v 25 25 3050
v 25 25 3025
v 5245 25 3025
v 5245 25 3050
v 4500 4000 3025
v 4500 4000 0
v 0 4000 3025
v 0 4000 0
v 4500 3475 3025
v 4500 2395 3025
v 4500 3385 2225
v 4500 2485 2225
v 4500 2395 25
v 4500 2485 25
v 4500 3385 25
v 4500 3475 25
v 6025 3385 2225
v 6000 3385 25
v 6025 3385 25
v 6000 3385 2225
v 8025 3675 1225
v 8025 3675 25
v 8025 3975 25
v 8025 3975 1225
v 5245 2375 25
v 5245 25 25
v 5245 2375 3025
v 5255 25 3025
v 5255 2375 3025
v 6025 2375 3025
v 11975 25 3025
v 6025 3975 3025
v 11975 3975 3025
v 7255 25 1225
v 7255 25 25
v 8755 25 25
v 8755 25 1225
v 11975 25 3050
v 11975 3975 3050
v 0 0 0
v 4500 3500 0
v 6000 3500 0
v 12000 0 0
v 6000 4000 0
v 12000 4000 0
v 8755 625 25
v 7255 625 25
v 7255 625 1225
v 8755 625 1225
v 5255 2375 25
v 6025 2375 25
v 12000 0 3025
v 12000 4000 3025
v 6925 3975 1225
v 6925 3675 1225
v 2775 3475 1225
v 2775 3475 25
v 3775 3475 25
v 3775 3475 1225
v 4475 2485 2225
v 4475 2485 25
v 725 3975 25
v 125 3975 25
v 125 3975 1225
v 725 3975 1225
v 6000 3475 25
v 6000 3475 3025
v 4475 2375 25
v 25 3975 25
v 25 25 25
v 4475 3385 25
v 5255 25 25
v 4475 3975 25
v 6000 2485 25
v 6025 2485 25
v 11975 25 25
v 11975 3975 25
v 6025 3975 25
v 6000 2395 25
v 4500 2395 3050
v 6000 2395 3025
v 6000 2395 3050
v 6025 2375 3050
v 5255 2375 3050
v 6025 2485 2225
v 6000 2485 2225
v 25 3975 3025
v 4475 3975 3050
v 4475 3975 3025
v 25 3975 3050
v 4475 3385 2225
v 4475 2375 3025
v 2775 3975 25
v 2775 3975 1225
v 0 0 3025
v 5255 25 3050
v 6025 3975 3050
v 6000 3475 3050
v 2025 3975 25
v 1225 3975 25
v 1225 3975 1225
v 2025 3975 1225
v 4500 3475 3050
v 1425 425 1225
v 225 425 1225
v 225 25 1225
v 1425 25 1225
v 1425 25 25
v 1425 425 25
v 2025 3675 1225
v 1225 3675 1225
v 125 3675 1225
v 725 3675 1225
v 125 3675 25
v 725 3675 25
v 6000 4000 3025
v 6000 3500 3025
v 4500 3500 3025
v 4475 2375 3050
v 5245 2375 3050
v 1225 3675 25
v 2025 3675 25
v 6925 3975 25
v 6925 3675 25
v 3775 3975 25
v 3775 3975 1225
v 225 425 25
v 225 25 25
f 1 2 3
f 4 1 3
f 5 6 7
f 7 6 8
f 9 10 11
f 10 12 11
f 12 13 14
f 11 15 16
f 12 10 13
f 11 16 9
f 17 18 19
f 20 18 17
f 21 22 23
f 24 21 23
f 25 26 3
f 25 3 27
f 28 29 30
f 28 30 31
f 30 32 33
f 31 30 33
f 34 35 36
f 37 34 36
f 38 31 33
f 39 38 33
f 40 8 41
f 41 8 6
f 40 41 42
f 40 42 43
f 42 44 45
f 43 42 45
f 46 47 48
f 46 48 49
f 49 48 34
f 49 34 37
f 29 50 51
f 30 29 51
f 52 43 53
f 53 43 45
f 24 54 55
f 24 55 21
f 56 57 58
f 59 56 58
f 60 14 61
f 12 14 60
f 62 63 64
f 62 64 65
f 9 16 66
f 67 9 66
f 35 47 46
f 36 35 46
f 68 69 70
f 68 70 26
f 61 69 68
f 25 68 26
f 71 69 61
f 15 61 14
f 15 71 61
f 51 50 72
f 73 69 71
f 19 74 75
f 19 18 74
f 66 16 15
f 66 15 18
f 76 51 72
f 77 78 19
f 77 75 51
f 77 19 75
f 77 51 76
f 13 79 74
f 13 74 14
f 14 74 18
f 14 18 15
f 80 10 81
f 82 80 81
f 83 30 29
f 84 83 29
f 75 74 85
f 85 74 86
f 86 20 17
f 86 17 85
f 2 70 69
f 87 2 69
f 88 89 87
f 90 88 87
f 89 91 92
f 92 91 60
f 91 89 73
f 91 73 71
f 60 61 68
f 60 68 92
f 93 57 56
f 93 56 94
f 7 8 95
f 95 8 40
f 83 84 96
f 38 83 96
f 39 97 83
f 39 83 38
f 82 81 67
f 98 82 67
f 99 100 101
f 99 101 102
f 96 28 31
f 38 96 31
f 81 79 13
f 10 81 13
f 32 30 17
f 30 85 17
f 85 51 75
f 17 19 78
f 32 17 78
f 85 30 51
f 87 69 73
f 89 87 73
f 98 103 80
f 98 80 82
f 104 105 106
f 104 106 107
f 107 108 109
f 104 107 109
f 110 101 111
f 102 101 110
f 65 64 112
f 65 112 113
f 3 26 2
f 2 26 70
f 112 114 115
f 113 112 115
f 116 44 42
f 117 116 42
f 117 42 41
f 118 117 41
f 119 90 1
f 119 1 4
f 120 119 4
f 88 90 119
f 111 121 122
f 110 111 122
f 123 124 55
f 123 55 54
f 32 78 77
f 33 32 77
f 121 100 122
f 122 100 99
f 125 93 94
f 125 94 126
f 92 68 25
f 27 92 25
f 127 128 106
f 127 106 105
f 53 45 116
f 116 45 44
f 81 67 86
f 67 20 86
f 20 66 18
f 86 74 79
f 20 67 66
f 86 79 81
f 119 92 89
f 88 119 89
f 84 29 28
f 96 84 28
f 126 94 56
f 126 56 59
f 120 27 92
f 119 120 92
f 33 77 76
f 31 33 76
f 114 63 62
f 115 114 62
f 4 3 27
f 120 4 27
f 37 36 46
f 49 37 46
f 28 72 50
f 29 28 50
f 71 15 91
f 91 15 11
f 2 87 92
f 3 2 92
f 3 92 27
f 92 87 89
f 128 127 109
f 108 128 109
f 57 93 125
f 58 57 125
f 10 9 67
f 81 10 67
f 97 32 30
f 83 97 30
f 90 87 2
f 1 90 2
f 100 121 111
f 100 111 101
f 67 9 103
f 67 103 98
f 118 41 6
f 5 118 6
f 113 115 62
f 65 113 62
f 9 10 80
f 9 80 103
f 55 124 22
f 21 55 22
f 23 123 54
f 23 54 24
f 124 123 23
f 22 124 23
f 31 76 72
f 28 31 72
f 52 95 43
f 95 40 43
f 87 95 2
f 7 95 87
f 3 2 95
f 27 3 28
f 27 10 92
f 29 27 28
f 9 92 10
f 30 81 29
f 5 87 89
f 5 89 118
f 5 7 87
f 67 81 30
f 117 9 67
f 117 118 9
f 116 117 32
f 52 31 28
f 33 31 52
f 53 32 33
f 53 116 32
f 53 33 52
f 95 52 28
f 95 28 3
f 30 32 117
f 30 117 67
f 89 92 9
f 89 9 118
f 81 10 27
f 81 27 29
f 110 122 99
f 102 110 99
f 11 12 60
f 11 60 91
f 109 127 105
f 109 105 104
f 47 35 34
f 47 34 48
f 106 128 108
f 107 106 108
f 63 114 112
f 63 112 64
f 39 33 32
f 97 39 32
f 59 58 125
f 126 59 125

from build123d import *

# Parameters (mm, degrees)
F1_DEPTH  = 25
F2_W      = 10
F2_H      = 2350
F3_DEPTH  = 3000
F4_W      = 900
F4_H      = 2200
F5_DEPTH  = 25
F6_W      = 900
F6_H      = 2200
F7_DEPTH  = 25
F8_W      = 600
F8_H      = 300
F9_DEPTH  = 1200
F8_W_2    = 800
F8_W_3    = 1000
F8_H_2    = 500
F8_W_4    = 1200
F8_H_3    = 400
F8_W_5    = 1500
F8_H_4    = 600
F8_W_6    = 1100
F11_DEPTH = 25
F10_W     = 1500
F10_H     = 1080


with BuildPart() as f1:
    # F0 (on Top) → F1 (new body)
    with BuildSketch(Plane.XY):
        Polygon((4500, 4000), (0, 4000), (0, 0), (12000, 0), (12000, 4000), (6000, 4000), (6000, 3500), (4500, 3500), align=None)
    extrude(amount=F1_DEPTH)

    # F2 (on face) → F3 (join)
    with BuildSketch(Plane.XY.offset(25)):
        Polygon((4500, 3500), (4500, 4000), (0, 4000), (0, 0), (12000, 0), (12000, 4000), (6000, 4000), (6000, 3500), align=None)
        Polygon((5245, 25), (25, 25), (25, 3975), (4475, 3975), (4475, 3475), (4500, 3475), (6000, 3475), (6025, 3475), (6025, 3975), (11975, 3975), (11975, 25), (5255, 25), align=None, mode=Mode.SUBTRACT)
        Polygon((4475, 2375), (5245, 2375), (5255, 2375), (6025, 2375), (6025, 3475), (6000, 3475), (6000, 2395), (4500, 2395), (4500, 3475), (4475, 3475), align=None)
        with Locations((5250, 1200)):
            Rectangle(F2_W, F2_H)
    extrude(amount=F3_DEPTH)

    # F4 (on face) → F5 (cut, through all)
    with BuildSketch(Plane.YZ.offset(4500)):
        with Locations((2935, 1125)):
            Rectangle(F4_W, F4_H)
    extrude(amount=-F5_DEPTH, mode=Mode.SUBTRACT)

    # F6 (on face) → F7 (cut, through all)
    with BuildSketch(Plane(origin=(6000, 0, 0), x_dir=(0, -1, 0), z_dir=(-1, 0, 0))):
        with Locations((-2935, 1125)):
            Rectangle(F6_W, F6_H)
    extrude(amount=-F7_DEPTH, mode=Mode.SUBTRACT)


with BuildPart() as f9:
    # F8 (on face) → F9 (new body)
    with BuildSketch(Plane.XY.offset(25)):
        with Locations((425, 3825)):
            Rectangle(F8_W, F8_H)
    extrude(amount=F9_DEPTH)


with BuildPart() as f9b:
    # F8 (on face) → F9, piece 2 (new body)
    with BuildSketch(Plane.XY.offset(25)):
        with Locations((1625, 3825)):
            Rectangle(F8_W_2, F8_H)
    extrude(amount=F9_DEPTH)


with BuildPart() as f9c:
    # F8 (on face) → F9, piece 3 (new body)
    with BuildSketch(Plane.XY.offset(25)):
        with Locations((3275, 3725)):
            Rectangle(F8_W_3, F8_H_2)
    extrude(amount=F9_DEPTH)


with BuildPart() as f9d:
    # F8 (on face) → F9, piece 4 (new body)
    with BuildSketch(Plane.XY.offset(25)):
        with Locations((825, 225)):
            Rectangle(F8_W_4, F8_H_3)
    extrude(amount=F9_DEPTH)


with BuildPart() as f9e:
    # F8 (on face) → F9, piece 5 (new body)
    with BuildSketch(Plane.XY.offset(25)):
        with Locations((8005, 325)):
            Rectangle(F8_W_5, F8_H_4)
    extrude(amount=F9_DEPTH)


with BuildPart() as f9f:
    # F8 (on face) → F9, piece 6 (new body)
    with BuildSketch(Plane.XY.offset(25)):
        with Locations((7475, 3825)):
            Rectangle(F8_W_6, F8_H)
    extrude(amount=F9_DEPTH)


with BuildPart() as f11:
    # F10 (on face) → F11 (new body)
    with BuildSketch(Plane.XY.offset(3025)):
        Polygon((6025, 2375), (5255, 2375), (5255, 25), (11975, 25), (11975, 3975), (6025, 3975), align=None)
    extrude(amount=F11_DEPTH)


with BuildPart() as f11b:
    # F10 (on face) → F11, piece 2 (new body)
    with BuildSketch(Plane.XY.offset(3025)):
        Polygon((25, 3975), (25, 25), (5245, 25), (5245, 2375), (4475, 2375), (4475, 3975), align=None)
    extrude(amount=F11_DEPTH)


with BuildPart() as f11c:
    # F10 (on face) → F11, piece 3 (new body)
    with BuildSketch(Plane.XY.offset(3025)):
        with Locations((5250, 2935)):
            Rectangle(F10_W, F10_H)
    extrude(amount=F11_DEPTH)


solid = Compound([f1.part, f9.part, f9b.part, f9c.part, f9d.part, f9e.part, f9f.part, f11.part, f11b.part, f11c.part])
